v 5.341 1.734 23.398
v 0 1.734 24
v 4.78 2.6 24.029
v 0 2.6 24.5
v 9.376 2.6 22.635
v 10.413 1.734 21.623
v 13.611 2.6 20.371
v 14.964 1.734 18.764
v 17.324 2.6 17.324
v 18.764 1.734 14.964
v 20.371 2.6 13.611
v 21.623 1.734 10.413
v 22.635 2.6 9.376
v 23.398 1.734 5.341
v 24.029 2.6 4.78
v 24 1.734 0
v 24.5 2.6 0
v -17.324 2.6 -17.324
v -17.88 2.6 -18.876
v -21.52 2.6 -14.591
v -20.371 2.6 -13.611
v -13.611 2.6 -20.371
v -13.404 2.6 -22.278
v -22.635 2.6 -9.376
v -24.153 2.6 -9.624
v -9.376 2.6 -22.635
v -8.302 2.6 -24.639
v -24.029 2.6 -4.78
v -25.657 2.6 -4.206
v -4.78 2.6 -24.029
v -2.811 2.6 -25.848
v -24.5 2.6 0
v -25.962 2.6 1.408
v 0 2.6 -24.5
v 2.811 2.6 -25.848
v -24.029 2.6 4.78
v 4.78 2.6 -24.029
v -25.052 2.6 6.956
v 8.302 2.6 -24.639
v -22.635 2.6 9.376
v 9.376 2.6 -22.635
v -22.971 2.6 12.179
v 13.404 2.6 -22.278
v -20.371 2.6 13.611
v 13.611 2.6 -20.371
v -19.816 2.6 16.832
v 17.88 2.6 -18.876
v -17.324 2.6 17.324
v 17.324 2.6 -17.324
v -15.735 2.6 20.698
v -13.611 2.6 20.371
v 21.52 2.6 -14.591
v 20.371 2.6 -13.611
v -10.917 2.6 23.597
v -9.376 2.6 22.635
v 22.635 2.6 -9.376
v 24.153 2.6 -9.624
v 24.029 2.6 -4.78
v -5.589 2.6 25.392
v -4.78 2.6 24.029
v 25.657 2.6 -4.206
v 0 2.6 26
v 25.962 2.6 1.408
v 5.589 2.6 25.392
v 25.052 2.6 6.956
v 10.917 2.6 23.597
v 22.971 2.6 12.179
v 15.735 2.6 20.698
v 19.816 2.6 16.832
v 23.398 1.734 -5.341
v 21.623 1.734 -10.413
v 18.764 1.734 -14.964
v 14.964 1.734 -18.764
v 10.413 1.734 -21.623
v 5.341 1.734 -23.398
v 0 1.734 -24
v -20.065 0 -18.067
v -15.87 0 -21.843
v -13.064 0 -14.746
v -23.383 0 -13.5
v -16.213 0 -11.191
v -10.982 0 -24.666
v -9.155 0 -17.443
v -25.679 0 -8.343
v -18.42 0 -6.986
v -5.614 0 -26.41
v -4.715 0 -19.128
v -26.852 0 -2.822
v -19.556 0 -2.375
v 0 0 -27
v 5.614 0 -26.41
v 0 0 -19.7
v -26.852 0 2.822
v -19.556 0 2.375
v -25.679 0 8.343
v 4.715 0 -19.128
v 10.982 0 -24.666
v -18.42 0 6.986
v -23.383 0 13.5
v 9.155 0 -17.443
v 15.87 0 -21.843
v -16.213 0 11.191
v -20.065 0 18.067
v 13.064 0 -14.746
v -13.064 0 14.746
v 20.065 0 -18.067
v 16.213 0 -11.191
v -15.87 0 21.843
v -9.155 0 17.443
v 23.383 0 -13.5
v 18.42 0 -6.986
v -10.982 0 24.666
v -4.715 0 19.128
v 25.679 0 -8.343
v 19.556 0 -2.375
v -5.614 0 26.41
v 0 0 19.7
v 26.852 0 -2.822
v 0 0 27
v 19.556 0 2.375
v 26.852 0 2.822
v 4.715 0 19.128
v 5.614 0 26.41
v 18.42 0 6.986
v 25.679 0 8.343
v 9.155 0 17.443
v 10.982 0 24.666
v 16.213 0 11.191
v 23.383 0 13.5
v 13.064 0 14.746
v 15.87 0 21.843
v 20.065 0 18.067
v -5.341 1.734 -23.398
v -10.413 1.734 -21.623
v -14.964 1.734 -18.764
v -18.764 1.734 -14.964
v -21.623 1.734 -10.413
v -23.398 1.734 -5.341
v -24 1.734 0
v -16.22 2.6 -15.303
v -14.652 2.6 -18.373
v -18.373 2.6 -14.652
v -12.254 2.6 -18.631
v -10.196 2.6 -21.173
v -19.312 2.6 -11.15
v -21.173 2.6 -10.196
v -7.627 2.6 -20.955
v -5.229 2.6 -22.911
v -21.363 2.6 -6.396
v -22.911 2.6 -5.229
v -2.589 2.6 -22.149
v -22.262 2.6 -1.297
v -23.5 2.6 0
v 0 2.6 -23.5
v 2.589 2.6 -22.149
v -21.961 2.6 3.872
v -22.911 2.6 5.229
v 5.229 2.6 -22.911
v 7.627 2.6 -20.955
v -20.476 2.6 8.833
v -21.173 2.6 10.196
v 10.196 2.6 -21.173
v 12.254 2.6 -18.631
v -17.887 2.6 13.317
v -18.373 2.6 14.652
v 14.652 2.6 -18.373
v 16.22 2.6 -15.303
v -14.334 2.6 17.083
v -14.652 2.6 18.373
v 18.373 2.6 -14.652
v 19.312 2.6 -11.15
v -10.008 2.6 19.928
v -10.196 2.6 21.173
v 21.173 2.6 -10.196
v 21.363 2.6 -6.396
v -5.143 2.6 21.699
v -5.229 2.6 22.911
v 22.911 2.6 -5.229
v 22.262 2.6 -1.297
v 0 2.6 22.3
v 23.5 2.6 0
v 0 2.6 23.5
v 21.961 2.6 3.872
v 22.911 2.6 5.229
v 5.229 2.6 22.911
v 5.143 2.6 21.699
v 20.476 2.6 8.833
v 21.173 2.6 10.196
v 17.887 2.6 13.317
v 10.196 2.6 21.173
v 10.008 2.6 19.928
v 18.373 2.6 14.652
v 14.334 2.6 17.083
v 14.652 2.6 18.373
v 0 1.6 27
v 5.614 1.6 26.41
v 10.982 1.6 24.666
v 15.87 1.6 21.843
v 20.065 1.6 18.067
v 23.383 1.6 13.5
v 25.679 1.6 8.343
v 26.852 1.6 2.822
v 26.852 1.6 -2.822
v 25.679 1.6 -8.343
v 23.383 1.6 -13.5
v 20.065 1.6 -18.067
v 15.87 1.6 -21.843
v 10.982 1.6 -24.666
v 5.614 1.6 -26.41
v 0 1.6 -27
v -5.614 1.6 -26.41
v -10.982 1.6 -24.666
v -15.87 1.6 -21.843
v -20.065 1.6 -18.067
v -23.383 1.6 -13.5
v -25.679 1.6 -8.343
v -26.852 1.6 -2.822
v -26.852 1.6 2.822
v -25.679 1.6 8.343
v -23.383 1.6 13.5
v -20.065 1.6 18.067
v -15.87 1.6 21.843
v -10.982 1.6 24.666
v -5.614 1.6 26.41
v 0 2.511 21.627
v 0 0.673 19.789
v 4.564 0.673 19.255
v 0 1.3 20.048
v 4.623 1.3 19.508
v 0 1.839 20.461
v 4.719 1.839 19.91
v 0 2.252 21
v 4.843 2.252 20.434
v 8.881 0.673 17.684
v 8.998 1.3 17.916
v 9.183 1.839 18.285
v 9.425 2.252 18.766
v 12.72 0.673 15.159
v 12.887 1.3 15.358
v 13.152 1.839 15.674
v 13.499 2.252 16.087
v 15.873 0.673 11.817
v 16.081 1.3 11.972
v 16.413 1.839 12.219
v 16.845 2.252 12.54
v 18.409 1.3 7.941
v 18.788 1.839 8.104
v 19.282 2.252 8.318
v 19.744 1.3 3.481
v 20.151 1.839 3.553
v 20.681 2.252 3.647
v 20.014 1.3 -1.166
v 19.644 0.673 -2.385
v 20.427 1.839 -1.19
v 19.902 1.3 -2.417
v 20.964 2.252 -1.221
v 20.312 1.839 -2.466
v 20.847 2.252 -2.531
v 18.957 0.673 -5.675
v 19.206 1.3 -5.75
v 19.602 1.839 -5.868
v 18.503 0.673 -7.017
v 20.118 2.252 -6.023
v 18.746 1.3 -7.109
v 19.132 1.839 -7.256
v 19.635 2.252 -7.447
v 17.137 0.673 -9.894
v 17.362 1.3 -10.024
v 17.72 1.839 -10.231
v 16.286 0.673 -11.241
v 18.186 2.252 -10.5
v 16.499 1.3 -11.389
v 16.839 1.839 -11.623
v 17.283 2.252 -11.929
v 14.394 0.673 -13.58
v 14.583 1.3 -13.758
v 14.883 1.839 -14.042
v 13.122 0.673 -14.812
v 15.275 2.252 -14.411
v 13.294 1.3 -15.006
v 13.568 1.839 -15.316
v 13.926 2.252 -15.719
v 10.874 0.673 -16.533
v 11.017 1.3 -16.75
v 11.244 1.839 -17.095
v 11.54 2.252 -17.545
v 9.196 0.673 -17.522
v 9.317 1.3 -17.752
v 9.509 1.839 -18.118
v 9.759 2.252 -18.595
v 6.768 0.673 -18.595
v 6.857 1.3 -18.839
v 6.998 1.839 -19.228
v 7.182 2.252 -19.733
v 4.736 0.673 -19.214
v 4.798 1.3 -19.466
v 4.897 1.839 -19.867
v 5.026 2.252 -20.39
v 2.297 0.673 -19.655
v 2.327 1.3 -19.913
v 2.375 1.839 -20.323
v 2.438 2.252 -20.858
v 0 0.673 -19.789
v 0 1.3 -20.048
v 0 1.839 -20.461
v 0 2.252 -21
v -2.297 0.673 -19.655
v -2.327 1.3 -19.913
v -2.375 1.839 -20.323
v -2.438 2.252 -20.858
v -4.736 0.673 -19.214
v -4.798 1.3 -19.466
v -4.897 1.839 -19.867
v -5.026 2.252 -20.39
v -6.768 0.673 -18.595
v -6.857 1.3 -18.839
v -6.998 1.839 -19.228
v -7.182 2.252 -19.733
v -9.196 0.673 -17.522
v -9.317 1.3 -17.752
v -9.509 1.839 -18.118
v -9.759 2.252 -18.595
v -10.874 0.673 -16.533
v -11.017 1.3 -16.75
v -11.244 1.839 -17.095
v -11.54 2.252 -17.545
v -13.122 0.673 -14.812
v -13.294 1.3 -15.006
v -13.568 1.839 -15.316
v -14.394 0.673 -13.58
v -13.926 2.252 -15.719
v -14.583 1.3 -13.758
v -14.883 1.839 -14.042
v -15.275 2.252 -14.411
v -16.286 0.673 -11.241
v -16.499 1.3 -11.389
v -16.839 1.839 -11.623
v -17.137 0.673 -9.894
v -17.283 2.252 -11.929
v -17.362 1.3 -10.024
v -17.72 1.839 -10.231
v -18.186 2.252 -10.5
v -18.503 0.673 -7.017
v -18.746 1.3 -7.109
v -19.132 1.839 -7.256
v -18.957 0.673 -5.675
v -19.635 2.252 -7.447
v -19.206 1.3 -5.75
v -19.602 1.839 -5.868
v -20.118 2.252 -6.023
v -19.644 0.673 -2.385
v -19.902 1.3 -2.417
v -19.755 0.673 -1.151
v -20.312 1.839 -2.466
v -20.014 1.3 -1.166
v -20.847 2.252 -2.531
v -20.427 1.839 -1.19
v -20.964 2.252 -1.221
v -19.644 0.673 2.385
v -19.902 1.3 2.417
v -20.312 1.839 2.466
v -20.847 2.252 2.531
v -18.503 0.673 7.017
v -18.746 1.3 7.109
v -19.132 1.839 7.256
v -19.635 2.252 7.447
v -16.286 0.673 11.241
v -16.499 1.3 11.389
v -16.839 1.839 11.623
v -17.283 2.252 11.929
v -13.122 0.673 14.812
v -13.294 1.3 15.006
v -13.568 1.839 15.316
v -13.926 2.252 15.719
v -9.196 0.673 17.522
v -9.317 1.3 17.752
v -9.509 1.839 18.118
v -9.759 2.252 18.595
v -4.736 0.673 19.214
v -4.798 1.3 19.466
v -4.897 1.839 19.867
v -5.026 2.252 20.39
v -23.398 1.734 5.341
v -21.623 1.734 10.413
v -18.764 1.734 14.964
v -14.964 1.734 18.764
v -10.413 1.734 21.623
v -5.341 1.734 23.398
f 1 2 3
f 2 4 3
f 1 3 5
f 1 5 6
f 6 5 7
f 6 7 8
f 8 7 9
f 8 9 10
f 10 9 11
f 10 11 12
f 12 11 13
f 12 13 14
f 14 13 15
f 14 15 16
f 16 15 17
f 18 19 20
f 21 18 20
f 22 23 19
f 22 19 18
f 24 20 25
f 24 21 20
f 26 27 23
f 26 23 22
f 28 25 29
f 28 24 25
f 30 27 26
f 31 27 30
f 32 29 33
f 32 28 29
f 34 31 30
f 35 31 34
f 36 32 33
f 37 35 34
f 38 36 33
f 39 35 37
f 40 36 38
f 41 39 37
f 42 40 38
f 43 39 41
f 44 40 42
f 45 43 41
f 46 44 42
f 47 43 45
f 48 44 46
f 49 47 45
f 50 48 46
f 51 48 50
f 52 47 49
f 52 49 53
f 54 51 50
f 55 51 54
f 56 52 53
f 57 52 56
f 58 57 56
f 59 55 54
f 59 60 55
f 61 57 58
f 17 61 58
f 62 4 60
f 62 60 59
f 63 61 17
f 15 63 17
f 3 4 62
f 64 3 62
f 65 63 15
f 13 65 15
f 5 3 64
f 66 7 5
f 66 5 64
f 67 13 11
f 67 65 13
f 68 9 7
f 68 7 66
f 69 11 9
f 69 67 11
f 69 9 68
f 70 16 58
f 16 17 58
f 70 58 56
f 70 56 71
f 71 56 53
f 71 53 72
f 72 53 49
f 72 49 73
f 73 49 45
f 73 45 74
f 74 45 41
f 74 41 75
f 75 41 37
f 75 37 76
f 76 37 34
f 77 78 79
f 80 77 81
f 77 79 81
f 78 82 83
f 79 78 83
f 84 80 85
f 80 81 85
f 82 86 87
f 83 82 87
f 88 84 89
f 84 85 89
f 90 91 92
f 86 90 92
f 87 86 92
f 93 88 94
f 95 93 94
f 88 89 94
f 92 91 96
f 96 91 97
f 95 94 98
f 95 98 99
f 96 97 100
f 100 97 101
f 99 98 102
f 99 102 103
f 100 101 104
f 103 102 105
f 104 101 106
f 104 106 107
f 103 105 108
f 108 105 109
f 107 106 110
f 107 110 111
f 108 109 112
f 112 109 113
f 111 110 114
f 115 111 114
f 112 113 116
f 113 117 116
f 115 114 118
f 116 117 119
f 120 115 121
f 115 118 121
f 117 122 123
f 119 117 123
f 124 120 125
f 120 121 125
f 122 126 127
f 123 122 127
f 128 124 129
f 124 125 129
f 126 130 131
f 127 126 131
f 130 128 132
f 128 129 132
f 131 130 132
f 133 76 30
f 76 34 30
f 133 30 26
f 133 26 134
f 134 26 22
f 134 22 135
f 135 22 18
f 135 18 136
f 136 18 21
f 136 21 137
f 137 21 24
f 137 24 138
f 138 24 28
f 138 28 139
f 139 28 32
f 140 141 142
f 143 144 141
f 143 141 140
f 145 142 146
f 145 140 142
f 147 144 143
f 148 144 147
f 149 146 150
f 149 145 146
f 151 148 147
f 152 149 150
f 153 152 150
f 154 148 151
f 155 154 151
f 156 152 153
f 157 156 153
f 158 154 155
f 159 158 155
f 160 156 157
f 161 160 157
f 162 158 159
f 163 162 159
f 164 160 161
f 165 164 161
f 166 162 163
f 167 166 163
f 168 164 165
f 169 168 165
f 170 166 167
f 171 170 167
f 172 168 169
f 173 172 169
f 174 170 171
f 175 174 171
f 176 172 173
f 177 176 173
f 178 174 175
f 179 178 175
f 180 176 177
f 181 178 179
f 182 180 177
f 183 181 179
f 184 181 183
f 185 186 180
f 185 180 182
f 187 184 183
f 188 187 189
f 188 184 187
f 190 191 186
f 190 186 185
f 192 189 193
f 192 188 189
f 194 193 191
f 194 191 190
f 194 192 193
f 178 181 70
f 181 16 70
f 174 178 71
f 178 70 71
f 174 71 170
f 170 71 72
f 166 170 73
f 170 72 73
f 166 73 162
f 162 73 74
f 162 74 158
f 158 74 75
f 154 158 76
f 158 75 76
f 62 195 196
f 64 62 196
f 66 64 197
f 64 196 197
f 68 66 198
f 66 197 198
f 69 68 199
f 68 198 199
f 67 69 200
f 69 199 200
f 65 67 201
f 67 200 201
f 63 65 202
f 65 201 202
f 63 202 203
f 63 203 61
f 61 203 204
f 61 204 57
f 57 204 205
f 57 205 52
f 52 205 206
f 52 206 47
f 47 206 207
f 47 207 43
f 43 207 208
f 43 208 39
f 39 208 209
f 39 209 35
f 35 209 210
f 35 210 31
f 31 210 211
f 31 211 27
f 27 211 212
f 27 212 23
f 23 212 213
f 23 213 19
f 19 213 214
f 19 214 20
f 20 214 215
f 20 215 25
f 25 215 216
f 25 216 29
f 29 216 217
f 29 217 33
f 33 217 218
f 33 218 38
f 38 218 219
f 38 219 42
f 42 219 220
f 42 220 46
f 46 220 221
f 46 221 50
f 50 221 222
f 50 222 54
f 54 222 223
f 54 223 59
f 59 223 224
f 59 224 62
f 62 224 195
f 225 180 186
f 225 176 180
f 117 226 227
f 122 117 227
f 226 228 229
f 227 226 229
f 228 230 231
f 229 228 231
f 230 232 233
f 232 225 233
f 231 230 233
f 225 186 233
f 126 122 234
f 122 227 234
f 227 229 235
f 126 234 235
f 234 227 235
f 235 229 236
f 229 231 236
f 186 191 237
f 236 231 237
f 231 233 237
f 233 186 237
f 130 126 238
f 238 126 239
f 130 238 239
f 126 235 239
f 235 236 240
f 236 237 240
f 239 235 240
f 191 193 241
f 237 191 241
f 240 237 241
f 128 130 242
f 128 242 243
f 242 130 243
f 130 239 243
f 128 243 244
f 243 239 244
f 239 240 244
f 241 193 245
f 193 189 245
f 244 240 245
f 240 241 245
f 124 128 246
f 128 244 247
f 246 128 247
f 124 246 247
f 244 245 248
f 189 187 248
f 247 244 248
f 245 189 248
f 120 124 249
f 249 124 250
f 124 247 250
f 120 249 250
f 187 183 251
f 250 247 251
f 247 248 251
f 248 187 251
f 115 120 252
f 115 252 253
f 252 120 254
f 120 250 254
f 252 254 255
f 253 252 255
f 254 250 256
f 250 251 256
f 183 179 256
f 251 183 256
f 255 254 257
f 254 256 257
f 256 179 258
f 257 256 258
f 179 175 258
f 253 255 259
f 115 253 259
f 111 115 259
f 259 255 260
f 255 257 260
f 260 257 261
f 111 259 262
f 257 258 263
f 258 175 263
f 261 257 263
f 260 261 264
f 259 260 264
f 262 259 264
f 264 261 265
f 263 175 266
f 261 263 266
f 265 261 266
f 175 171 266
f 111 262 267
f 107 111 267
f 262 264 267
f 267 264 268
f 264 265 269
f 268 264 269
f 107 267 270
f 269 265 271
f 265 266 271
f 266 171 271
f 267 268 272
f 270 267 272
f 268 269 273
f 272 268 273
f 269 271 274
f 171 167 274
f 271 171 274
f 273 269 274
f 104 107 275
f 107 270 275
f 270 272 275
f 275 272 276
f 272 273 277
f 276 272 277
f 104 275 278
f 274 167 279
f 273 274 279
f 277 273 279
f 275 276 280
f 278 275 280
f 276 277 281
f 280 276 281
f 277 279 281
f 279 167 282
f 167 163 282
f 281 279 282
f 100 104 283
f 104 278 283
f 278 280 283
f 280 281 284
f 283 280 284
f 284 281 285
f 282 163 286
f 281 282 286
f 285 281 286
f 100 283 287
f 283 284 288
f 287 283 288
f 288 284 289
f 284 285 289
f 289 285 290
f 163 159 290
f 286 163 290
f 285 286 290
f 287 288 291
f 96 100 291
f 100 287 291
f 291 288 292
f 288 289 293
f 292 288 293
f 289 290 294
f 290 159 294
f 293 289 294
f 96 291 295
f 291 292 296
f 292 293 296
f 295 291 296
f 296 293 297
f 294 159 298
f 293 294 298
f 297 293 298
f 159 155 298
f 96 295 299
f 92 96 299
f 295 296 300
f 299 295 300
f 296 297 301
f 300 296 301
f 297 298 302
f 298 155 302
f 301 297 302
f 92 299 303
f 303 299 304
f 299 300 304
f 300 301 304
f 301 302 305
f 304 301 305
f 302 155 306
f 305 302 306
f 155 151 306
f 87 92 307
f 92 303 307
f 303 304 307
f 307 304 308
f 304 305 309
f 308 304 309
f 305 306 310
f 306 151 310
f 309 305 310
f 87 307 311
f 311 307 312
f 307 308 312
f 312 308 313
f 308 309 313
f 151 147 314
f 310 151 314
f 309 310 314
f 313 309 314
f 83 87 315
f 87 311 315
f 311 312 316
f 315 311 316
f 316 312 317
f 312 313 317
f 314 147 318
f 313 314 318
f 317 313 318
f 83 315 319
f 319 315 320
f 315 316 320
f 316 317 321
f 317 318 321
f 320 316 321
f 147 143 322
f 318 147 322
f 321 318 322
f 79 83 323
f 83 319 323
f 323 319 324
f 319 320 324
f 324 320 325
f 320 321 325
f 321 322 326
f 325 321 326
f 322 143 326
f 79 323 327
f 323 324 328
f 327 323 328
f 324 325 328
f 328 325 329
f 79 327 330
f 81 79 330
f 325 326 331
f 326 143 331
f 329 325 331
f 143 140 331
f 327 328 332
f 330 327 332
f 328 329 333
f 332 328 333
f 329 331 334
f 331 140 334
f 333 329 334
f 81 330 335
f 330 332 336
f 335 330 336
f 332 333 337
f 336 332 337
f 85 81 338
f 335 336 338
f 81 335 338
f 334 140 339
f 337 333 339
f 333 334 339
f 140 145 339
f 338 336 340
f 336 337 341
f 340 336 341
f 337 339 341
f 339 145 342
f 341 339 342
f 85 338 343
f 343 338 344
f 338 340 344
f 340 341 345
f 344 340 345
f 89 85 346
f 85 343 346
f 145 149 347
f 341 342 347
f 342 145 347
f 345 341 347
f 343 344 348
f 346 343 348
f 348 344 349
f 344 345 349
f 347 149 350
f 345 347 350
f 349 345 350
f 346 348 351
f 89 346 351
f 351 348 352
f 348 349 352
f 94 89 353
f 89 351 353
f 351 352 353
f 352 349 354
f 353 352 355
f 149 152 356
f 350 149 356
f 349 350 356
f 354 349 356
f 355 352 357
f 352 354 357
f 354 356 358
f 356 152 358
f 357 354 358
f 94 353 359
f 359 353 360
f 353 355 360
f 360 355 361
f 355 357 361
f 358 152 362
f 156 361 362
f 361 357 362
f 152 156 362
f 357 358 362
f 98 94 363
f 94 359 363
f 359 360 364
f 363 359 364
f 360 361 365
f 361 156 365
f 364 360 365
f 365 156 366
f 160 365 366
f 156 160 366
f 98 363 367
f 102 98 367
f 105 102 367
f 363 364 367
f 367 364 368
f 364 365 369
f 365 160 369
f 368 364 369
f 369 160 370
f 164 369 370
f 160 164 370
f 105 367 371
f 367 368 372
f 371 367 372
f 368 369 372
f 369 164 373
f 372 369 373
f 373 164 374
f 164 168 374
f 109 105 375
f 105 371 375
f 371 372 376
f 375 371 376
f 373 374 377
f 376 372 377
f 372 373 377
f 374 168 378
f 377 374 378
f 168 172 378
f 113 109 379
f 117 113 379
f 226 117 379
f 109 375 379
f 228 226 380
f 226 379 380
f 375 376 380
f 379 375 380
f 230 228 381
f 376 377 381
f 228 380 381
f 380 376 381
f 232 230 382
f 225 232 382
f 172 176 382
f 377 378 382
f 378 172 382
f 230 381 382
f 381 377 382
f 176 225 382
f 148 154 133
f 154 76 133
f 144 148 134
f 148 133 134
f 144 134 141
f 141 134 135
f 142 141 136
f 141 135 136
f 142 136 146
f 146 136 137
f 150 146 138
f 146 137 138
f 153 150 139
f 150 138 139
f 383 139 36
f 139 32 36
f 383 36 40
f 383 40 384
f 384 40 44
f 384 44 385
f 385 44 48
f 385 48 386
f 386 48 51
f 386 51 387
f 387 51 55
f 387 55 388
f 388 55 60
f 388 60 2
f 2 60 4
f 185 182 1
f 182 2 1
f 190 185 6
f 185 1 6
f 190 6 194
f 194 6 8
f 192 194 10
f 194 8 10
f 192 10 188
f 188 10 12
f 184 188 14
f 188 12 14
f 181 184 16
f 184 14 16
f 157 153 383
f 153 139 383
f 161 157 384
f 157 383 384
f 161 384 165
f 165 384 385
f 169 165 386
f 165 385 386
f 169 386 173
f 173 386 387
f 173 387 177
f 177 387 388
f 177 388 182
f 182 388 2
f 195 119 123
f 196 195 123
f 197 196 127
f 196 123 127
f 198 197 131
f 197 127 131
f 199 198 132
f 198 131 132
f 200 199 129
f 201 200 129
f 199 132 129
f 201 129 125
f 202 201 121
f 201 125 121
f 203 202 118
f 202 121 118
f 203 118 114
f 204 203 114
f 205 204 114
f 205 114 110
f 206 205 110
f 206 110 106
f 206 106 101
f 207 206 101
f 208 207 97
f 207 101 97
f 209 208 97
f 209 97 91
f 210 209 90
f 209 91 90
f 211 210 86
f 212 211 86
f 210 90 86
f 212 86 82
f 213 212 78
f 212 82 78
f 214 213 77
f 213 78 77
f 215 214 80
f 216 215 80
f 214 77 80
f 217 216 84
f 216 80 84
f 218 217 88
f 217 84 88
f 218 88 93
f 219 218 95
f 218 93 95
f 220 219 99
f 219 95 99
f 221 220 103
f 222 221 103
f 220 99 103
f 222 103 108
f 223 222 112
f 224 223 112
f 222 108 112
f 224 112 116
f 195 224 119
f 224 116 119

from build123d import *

# Parameters (mm, degrees)
SKETCH1_R           = 27
SKETCH1_R_2         = 19.7
BOSS_EXTRUDE1_DEPTH = 2.6
FILLET1_R           = 2.6
CHAMFER1_SIZE       = 1


with BuildPart() as part:
    # Sketch1 → Boss-Extrude1 (new body)
    with BuildSketch(Plane(origin=(0, 0, 0), x_dir=(1, 0, 0), z_dir=(0, 1, 0))):
        with Locations(Location((0, 0, 0), (0, 0, 270))):
            Circle(SKETCH1_R)
        with Locations(Location((0, 0, 0), (0, 0, 270))):
            Circle(SKETCH1_R_2, mode=Mode.SUBTRACT)
    extrude(amount=BOSS_EXTRUDE1_DEPTH)

    # Fillet1
    fillet1_edges = [part.edges().sort_by_distance(p)[0] for p in [
        (0, 2.6, -19.7),
    ]]
    fillet(fillet1_edges, radius=FILLET1_R - 0.0001)  # a hair under: the kernel refuses the full size

    # Chamfer1
    chamfer1_edges = [part.edges().sort_by_distance(p)[0] for p in [
        (0, 2.6, -27),
    ]]
    chamfer(chamfer1_edges, length=CHAMFER1_SIZE)

    # Cut-Sweep1: sweep along a curve in space
    with BuildLine() as cut_sweep1_path:
        ThreePointArc((0, 0, 19.7), (13.930003589, 0, 13.930003589), (19.7, 0, 0))
        ThreePointArc((19.7, 0, 0), (13.930003589, 0, -13.930003589), (0, 0, -19.7))
        ThreePointArc((0, 0, -19.7), (-13.930003589, 0, -13.930003589), (-19.7, 0, 0))
        ThreePointArc((-19.7, 0, 0), (-13.930003589, 0, 13.930003589), (0, 0, 19.7))
    # Sketch2 → Cut-Sweep1 (sweep, cut)
    with BuildSketch(Plane(origin=(0, 0, 0), x_dir=(0, 0, -1), z_dir=(1, 0, 0))):
        Polygon((24.5, 2.6), (24, 1.733974596), (23.5, 2.6), align=None)
    sweep(path=cut_sweep1_path.line, mode=Mode.SUBTRACT)


solid = part.part
